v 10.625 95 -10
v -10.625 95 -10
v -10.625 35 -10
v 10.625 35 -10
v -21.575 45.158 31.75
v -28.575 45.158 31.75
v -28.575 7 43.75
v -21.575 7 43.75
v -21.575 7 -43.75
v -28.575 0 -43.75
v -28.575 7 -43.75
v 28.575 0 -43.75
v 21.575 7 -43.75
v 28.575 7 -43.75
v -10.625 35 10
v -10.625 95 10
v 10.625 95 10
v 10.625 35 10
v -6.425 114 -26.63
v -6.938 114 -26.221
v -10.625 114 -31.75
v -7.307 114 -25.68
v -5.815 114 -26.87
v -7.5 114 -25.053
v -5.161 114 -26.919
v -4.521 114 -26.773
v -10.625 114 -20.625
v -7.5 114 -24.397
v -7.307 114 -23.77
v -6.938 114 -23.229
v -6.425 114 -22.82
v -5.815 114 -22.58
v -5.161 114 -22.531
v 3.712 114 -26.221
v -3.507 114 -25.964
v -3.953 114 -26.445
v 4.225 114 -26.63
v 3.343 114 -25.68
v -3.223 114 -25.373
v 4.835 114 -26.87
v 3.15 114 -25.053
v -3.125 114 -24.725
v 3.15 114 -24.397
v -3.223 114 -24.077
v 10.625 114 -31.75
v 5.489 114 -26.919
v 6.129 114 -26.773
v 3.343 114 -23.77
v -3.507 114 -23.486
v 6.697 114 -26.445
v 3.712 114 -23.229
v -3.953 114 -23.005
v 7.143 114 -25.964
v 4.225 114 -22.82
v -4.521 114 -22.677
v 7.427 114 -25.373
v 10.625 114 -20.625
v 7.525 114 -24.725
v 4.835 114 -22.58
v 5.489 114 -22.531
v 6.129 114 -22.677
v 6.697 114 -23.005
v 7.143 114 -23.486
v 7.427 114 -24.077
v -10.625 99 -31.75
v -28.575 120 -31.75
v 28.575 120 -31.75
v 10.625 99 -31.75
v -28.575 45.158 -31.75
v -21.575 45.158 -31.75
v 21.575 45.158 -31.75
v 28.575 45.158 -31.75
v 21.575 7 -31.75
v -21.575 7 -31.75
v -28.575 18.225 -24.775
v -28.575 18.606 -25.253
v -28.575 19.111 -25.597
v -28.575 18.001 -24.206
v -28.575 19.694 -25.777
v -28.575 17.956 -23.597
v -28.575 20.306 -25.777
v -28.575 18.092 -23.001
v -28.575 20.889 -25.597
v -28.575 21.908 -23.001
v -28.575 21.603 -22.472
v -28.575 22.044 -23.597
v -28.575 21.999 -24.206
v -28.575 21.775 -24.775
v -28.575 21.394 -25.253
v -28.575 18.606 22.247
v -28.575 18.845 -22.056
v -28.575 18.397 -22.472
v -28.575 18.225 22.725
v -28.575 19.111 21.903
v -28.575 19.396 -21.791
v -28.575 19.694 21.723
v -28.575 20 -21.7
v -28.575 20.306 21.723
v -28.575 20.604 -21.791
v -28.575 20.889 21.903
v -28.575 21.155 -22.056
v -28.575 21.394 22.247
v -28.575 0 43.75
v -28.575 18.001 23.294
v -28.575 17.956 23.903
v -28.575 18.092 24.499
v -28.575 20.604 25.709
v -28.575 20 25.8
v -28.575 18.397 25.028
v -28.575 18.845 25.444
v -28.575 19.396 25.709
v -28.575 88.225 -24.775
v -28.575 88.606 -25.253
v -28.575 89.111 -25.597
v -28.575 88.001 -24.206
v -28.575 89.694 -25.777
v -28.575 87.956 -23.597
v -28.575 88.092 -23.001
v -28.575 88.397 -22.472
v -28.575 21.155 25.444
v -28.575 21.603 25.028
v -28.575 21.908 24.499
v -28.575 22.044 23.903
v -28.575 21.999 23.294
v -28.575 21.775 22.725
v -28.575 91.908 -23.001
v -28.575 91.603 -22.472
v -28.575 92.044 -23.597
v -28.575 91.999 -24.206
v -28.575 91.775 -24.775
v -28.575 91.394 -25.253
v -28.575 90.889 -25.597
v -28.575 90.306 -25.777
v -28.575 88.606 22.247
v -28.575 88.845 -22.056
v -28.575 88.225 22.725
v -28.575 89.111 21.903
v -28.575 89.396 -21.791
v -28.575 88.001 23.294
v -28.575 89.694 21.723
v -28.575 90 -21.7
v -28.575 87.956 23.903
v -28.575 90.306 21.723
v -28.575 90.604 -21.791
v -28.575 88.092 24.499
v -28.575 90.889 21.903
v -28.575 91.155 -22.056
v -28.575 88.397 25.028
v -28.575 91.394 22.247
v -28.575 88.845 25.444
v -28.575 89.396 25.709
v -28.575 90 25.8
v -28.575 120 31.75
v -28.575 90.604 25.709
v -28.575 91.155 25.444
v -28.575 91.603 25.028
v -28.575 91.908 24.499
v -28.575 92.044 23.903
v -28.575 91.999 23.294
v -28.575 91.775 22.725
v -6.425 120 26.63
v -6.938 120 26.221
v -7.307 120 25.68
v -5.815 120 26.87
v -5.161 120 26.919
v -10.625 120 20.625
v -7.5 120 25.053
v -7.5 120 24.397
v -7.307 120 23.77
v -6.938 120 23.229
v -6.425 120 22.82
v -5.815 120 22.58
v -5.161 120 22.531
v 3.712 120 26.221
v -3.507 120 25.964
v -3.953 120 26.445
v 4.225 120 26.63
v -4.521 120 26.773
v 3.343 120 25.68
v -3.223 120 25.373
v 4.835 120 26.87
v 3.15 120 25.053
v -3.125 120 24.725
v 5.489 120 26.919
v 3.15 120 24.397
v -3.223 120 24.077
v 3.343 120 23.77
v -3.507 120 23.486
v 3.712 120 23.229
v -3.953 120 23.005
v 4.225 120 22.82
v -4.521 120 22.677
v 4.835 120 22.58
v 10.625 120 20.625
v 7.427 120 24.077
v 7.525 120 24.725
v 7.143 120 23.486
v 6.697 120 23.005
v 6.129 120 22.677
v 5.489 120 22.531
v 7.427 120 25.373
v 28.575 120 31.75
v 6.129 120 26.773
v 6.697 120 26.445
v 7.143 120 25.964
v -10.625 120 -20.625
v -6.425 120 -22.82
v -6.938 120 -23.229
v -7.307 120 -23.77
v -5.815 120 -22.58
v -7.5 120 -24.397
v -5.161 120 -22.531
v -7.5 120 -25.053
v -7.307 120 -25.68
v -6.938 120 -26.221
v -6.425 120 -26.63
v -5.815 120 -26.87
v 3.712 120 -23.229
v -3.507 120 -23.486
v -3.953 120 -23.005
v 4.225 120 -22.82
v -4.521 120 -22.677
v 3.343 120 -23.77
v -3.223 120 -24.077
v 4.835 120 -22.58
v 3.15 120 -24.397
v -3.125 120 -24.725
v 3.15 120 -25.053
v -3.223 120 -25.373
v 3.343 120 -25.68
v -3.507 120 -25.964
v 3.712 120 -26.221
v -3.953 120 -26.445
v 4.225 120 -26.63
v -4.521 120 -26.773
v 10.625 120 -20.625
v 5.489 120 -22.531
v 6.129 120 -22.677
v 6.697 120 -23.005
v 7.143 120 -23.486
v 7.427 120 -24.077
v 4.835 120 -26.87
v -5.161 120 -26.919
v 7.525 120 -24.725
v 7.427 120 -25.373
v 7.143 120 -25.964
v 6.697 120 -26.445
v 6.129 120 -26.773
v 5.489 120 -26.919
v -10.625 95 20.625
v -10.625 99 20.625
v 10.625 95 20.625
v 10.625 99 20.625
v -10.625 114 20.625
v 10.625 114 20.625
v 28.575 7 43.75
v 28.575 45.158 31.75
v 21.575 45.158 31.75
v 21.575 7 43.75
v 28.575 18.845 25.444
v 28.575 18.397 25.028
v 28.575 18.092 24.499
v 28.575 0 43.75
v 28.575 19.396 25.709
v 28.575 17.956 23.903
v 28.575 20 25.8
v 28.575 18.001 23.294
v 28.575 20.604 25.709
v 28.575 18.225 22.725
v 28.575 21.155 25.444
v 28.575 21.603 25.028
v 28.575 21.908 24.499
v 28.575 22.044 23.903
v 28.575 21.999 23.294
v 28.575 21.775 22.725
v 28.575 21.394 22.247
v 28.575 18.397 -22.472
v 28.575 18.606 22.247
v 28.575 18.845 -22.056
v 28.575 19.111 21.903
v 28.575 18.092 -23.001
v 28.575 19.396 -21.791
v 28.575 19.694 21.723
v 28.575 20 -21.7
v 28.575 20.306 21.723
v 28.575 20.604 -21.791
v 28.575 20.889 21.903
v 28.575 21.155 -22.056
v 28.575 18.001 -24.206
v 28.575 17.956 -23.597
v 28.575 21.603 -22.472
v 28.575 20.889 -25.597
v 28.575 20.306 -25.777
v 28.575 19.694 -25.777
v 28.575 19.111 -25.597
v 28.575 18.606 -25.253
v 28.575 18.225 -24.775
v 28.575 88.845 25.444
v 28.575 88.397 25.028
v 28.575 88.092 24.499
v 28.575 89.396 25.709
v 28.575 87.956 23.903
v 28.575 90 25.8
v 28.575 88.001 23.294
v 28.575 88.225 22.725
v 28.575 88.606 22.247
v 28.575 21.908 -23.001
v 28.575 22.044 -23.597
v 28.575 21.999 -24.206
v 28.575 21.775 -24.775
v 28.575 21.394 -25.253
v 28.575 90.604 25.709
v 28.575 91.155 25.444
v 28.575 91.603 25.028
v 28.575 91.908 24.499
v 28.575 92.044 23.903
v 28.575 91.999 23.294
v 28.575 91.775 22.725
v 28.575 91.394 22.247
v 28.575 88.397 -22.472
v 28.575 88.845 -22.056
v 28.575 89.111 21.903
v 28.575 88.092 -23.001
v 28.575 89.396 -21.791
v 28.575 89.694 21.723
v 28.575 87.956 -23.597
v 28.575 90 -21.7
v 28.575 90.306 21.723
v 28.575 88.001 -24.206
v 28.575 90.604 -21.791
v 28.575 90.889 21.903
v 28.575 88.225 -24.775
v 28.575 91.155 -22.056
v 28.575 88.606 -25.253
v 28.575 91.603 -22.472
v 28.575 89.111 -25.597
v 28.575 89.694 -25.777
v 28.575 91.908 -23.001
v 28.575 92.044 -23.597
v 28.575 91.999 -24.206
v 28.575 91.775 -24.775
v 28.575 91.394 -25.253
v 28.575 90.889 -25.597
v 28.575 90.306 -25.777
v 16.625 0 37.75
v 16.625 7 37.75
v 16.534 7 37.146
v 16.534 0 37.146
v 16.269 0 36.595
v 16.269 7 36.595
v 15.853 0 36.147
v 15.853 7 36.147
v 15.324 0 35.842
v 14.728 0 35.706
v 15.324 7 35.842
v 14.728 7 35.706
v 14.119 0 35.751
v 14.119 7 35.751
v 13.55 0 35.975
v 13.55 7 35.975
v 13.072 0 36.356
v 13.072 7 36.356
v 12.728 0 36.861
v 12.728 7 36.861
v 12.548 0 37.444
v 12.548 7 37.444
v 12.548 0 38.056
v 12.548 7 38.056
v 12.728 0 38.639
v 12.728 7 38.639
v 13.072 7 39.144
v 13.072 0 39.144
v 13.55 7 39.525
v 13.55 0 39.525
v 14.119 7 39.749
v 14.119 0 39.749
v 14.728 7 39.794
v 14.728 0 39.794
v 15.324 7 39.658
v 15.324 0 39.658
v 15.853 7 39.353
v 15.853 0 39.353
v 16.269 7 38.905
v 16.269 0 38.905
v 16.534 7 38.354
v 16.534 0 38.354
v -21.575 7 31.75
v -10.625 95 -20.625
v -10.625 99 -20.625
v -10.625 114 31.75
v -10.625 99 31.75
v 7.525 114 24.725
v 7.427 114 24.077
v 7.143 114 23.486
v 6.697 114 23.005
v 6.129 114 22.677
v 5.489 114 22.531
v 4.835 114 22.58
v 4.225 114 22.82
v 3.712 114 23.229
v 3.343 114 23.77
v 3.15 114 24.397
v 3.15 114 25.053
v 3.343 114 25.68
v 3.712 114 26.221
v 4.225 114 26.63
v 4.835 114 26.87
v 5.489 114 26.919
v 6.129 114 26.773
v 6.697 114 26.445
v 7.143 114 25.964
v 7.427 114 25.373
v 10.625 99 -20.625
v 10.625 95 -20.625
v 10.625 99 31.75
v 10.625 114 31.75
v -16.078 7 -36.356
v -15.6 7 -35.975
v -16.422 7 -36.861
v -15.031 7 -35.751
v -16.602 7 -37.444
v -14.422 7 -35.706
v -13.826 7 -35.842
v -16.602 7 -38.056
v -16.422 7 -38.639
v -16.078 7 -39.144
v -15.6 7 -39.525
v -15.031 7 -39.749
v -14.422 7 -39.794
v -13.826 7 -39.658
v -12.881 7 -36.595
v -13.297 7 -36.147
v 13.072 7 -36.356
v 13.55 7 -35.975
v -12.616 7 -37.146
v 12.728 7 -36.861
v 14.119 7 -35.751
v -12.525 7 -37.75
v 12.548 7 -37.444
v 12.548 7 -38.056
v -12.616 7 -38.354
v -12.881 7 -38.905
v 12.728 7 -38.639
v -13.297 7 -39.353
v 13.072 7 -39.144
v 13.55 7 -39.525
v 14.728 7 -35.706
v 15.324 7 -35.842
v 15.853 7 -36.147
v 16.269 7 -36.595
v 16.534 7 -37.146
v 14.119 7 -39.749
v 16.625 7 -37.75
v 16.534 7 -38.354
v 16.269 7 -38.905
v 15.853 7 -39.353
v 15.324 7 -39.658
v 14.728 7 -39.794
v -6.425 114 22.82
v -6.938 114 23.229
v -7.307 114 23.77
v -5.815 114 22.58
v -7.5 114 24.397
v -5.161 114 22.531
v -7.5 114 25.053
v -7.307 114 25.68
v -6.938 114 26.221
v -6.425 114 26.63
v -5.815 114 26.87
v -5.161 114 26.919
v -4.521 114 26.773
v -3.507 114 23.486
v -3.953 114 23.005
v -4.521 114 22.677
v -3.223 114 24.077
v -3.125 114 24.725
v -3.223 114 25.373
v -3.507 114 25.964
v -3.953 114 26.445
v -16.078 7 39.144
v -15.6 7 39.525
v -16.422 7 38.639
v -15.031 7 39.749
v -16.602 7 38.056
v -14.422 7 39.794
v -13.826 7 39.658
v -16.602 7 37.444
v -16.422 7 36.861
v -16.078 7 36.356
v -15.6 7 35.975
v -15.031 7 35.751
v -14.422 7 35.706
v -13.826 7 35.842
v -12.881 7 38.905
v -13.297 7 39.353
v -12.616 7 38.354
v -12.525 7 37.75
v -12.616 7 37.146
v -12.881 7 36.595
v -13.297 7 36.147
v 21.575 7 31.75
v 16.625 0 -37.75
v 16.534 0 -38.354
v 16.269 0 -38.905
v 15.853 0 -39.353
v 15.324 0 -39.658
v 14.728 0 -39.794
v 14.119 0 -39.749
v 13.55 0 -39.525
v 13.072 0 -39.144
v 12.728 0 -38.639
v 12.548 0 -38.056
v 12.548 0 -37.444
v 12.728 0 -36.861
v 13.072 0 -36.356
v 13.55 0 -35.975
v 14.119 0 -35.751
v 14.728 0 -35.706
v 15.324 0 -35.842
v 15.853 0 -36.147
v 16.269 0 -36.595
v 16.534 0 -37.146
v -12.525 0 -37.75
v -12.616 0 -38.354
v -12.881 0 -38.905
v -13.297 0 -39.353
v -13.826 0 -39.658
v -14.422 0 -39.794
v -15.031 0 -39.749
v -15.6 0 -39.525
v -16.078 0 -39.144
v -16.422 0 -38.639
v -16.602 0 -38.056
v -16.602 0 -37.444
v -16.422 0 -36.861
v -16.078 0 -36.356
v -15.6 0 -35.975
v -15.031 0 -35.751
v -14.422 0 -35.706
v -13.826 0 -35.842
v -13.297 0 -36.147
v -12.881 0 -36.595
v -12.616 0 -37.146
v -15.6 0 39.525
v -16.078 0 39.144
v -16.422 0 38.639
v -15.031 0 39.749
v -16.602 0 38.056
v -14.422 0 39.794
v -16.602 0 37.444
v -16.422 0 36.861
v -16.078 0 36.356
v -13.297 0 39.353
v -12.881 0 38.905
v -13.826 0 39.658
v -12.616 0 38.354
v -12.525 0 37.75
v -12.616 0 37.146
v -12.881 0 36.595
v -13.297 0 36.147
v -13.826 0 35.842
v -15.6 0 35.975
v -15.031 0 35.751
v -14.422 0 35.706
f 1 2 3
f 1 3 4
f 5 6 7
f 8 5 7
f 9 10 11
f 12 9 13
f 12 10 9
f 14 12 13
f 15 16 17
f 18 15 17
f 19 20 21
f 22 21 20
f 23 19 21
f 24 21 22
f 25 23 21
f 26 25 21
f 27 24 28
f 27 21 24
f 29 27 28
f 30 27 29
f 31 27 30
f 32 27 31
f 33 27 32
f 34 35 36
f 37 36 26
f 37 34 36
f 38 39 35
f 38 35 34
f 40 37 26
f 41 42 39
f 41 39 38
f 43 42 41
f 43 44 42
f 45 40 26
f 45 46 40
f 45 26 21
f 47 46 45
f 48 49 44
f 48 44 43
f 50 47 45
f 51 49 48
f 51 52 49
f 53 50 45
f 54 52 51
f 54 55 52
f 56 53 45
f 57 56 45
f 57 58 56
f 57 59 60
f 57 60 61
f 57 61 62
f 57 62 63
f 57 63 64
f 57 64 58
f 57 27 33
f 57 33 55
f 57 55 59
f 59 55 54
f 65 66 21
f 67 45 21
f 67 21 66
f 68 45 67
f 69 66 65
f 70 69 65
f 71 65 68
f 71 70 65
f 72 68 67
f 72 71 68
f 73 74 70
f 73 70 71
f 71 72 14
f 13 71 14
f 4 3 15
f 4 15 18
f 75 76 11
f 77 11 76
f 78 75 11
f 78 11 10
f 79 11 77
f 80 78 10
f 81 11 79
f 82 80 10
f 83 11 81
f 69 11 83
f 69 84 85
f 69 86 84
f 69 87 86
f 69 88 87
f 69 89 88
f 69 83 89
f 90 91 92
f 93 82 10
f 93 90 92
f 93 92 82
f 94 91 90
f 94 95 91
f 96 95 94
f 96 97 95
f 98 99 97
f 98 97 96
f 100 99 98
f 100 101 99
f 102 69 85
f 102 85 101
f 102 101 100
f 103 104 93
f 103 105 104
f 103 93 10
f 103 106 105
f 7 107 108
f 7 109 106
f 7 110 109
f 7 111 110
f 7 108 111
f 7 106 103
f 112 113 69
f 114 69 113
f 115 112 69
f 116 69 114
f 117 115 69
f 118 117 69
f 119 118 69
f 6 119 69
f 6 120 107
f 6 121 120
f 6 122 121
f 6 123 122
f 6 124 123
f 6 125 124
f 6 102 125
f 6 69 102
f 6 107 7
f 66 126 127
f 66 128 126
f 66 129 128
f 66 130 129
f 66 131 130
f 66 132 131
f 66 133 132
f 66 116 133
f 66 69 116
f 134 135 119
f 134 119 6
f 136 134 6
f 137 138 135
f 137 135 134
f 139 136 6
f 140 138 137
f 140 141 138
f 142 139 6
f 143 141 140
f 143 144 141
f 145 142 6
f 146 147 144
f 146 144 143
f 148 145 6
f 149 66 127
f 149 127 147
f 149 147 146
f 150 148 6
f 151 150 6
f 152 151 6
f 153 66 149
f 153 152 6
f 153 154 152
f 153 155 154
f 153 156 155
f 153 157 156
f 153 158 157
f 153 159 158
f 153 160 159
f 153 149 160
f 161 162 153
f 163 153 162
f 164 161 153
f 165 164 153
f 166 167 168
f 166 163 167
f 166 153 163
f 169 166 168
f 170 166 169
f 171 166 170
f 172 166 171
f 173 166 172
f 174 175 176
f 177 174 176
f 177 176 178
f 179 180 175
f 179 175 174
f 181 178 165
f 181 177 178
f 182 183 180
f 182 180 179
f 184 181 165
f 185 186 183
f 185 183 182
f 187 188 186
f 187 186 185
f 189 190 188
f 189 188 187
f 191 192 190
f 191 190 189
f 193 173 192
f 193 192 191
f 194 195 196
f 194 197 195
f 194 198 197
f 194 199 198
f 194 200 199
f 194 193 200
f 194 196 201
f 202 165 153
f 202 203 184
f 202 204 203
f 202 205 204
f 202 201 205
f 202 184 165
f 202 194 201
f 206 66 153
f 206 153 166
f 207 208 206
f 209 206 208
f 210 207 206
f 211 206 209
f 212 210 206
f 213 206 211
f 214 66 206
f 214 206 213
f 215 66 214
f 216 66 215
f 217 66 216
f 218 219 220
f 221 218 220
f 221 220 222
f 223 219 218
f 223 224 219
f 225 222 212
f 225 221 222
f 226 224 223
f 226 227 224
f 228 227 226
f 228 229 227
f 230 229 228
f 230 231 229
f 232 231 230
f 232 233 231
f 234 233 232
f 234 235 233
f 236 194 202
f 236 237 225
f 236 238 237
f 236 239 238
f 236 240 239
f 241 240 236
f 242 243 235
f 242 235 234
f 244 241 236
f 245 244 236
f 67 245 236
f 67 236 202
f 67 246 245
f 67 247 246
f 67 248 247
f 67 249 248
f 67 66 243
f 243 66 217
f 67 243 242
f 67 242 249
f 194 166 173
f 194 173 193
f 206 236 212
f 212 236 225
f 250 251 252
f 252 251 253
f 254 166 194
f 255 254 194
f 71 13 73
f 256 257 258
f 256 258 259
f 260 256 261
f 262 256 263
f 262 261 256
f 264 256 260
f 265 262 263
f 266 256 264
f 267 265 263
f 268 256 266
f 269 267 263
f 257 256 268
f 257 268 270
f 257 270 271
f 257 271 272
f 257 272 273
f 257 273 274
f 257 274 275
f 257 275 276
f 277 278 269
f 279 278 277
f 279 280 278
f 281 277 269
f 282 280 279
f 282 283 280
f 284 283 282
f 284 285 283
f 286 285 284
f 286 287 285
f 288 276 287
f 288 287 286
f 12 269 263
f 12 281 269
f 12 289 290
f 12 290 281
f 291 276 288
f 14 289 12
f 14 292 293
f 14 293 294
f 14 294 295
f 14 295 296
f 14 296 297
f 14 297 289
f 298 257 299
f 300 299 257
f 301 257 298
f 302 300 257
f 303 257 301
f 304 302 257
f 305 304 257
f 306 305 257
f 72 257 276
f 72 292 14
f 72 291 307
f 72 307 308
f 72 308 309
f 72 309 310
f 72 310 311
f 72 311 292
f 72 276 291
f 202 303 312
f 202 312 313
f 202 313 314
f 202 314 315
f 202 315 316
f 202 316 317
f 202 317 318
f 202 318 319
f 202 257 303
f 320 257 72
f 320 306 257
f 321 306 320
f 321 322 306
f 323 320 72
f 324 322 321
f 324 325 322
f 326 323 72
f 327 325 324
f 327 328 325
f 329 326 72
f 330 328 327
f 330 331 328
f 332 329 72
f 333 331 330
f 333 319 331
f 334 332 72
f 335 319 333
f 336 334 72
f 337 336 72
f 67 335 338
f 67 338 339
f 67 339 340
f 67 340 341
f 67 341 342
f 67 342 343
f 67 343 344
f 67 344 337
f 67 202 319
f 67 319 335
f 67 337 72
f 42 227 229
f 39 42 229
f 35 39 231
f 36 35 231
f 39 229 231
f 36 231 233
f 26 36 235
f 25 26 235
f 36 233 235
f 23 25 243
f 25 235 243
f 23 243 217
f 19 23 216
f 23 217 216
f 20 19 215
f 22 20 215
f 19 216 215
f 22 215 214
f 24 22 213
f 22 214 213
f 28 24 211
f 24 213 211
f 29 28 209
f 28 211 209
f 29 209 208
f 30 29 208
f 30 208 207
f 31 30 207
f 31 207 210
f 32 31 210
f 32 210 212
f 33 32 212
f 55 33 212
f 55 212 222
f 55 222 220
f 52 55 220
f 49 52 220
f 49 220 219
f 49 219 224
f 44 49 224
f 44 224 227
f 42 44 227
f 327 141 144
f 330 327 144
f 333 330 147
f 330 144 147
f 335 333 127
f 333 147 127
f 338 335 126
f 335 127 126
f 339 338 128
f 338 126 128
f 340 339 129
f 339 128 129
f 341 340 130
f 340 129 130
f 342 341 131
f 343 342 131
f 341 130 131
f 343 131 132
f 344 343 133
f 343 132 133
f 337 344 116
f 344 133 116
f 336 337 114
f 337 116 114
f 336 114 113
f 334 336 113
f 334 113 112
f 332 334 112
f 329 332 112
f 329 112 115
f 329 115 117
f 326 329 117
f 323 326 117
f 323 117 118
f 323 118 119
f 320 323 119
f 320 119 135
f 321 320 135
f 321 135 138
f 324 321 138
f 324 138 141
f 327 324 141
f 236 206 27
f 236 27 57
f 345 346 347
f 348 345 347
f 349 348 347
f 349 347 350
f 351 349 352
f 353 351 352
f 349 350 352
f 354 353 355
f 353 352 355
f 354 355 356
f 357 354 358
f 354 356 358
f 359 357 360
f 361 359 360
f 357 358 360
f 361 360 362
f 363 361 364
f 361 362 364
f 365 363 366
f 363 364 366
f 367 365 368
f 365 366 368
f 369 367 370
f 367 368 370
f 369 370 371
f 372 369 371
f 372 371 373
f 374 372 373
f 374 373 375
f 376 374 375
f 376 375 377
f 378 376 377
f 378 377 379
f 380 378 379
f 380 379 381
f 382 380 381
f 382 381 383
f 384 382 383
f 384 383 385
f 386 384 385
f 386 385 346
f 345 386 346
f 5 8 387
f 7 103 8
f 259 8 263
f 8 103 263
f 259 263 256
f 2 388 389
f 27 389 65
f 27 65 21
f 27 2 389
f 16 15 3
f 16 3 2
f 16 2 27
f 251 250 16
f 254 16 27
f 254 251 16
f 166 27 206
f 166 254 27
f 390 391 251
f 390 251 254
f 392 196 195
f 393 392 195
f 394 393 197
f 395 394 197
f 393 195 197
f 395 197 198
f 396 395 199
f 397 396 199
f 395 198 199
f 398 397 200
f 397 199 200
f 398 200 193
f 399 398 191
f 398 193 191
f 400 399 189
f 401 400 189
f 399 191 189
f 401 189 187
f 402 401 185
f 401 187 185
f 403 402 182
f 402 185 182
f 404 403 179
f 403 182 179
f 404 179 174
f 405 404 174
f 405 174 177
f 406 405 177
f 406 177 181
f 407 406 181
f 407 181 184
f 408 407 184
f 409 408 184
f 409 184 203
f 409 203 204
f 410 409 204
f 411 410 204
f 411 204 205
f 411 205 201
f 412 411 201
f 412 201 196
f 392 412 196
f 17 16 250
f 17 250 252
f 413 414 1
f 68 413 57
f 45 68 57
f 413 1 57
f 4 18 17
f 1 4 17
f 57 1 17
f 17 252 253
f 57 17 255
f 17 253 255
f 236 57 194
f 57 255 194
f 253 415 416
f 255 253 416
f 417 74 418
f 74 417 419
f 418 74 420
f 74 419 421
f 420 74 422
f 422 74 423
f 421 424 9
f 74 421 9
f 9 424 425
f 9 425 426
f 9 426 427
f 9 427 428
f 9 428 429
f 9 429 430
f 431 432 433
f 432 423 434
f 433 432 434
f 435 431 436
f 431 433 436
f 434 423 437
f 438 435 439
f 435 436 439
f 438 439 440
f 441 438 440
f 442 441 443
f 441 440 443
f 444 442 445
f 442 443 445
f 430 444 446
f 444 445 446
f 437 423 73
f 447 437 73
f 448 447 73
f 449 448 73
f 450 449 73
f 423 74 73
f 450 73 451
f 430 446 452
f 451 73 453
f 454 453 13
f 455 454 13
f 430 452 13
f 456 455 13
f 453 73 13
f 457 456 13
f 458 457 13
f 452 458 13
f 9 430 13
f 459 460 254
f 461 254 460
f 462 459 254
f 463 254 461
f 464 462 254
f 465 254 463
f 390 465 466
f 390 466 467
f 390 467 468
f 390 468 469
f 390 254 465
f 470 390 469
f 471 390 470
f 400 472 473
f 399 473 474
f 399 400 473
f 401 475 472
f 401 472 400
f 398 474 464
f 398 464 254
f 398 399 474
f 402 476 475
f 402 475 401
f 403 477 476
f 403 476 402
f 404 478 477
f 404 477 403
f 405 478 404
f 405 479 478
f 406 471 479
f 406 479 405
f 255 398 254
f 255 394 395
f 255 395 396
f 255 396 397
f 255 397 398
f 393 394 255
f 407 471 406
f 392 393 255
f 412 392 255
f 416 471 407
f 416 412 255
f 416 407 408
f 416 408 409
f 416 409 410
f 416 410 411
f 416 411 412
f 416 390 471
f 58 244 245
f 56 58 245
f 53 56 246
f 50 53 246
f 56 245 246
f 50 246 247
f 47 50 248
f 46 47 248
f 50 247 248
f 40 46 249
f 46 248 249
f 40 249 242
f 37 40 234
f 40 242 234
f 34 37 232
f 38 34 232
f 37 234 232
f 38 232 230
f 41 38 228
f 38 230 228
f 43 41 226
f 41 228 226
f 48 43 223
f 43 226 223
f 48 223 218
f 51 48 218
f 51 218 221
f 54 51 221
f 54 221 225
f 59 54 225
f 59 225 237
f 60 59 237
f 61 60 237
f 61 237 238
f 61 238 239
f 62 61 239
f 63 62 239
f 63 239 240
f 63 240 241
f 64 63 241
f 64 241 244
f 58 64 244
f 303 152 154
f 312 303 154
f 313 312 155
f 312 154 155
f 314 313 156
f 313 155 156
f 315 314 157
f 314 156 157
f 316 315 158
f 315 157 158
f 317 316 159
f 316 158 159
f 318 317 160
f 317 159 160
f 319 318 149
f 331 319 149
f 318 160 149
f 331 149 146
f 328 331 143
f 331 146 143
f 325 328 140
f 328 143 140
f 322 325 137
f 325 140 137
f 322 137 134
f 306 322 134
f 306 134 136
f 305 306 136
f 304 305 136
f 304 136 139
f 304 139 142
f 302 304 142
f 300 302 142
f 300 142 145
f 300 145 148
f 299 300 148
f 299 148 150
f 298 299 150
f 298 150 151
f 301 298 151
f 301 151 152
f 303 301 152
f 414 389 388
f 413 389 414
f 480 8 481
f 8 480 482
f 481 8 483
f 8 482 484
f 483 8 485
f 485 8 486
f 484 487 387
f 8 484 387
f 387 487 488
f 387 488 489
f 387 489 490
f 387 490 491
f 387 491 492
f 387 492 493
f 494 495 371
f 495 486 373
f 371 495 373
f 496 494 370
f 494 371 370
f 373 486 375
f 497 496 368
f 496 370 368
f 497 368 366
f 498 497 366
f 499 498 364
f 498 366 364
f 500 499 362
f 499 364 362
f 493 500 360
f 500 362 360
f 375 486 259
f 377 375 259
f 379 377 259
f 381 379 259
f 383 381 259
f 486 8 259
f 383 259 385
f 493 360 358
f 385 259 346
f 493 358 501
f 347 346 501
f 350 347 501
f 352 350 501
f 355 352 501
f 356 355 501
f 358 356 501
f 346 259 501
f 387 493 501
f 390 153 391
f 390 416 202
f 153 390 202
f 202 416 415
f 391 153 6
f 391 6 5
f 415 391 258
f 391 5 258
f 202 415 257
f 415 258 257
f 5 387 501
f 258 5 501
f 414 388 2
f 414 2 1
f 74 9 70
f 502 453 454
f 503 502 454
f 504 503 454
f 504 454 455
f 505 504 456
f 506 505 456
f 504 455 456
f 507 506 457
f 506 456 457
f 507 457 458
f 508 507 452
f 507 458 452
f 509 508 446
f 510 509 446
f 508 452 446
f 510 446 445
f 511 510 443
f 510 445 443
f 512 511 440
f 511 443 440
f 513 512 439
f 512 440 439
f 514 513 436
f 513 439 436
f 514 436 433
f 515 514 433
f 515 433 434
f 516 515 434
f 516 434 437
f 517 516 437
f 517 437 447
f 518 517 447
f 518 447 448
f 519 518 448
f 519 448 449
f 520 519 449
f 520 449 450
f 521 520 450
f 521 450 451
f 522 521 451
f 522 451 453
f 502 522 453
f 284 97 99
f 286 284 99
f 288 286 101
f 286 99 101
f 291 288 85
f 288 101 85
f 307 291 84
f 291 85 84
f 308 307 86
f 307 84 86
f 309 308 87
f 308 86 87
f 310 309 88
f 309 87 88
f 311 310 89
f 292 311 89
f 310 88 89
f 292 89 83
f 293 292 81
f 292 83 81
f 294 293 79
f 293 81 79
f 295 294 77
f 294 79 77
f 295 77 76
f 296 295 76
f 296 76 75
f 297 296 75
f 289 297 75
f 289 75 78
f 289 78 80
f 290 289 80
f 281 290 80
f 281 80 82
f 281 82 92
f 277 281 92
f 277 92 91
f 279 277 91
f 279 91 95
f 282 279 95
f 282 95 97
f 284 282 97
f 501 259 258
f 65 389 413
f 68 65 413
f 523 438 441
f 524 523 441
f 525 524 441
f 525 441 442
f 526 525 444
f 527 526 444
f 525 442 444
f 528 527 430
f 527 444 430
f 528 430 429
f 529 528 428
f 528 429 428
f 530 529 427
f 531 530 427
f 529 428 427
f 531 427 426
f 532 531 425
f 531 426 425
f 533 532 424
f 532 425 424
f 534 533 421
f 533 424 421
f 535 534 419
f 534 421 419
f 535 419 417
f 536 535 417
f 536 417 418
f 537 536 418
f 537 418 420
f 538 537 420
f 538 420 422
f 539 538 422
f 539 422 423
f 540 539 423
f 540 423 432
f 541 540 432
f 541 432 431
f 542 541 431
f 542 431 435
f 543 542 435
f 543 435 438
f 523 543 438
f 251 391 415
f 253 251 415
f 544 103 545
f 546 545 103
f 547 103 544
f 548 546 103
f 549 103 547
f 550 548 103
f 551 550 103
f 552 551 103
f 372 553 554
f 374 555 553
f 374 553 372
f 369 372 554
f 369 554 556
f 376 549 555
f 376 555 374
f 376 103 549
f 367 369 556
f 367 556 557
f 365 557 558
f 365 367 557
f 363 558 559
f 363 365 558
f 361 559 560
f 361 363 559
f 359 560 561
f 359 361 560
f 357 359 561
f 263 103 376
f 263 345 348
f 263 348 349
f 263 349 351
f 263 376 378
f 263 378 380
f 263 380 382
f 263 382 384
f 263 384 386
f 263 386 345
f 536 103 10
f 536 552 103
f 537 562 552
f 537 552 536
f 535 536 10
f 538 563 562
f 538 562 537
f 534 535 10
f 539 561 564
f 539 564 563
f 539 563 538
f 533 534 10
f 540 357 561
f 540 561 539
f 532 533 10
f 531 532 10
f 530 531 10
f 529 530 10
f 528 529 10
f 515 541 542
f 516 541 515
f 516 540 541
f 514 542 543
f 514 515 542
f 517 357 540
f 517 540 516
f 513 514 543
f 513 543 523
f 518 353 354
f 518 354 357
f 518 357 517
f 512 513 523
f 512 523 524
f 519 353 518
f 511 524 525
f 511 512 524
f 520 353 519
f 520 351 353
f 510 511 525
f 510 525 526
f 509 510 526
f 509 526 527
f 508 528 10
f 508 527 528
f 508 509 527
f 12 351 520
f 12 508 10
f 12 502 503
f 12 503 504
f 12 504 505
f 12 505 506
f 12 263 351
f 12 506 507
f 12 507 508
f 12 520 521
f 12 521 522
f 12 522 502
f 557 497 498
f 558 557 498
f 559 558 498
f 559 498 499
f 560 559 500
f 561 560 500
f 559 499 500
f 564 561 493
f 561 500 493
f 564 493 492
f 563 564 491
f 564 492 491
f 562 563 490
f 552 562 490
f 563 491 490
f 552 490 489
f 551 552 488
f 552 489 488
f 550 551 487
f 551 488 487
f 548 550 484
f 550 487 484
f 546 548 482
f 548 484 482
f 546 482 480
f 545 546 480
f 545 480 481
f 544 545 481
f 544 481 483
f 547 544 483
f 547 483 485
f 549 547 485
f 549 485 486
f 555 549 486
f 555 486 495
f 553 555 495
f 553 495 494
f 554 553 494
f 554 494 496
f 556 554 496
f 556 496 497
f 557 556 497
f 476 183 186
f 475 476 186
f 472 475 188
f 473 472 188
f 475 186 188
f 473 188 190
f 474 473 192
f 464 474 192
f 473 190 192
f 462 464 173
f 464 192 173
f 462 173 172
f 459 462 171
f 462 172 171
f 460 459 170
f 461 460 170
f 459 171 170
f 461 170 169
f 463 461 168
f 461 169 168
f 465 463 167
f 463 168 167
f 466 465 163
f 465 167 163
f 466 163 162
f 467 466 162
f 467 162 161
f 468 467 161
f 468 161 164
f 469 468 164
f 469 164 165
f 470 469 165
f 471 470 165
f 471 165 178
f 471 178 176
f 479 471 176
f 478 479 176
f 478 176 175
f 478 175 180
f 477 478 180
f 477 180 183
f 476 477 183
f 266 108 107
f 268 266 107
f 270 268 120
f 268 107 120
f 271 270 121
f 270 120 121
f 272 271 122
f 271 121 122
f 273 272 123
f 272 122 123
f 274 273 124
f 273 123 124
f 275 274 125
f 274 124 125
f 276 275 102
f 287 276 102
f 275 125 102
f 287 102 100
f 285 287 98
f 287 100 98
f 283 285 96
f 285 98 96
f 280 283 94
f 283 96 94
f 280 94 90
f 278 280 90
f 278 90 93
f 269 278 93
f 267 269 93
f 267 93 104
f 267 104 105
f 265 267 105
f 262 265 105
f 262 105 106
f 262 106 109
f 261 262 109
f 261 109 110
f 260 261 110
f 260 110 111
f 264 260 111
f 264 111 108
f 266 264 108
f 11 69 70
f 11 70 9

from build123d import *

# Parameters (mm, degrees)
SKETCH1_W           = 57.15
SKETCH1_H           = 63.5
BOSS_EXTRUDE1_DEPTH = 120
SKETCH2_W           = 21.25
SKETCH2_H           = 41.25
CUT_EXTRUDE1_DEPTH  = 25
SKETCH3_R           = 2.2
CUT_EXTRUDE2_DEPTH  = 10
SKETCH4_W           = 21.25
SKETCH4_H           = 15
CUT_EXTRUDE3_DEPTH  = 64.5
SKETCH7_R           = 2.05
CUT_EXTRUDE4_DEPTH  = 58.15
SKETCH9_W           = 12
SKETCH9_H           = 7
BOSS_EXTRUDE2_DEPTH = 57.15
SKETCH10_R          = 2.05
CUT_EXTRUDE5_DEPTH  = 8
BOSS_EXTRUDE3_DEPTH = 7
BOSS_EXTRUDE4_DEPTH = 7
SKETCH13_W          = 21.25
SKETCH13_H          = 20
CUT_EXTRUDE6_DEPTH  = 60


with BuildPart() as part:
    # Sketch1 → Boss-Extrude1 (new body)
    with BuildSketch(Plane(origin=(0, 0, 0), x_dir=(1, 0, 0), z_dir=(0, 1, 0))):
        Rectangle(SKETCH1_W, SKETCH1_H)
    extrude(amount=BOSS_EXTRUDE1_DEPTH)

    # Sketch2 → Cut-Extrude1 (cut)
    with BuildSketch(Plane(origin=(0, 120, 0), x_dir=(1, 0, 0), z_dir=(0, 1, 0))):
        Rectangle(SKETCH2_W, SKETCH2_H)
    extrude(amount=-CUT_EXTRUDE1_DEPTH, mode=Mode.SUBTRACT)

    # Sketch3 → Cut-Extrude2 (cut)
    with BuildSketch(Plane(origin=(0, 120, 0), x_dir=(1, 0, 0), z_dir=(0, 1, 0))):
        with Locations((5.325, 24.725)):
            Circle(SKETCH3_R)
        with Locations((-5.325, 24.725)):
            Circle(SKETCH3_R)
        with Locations((5.325, -24.725)):
            Circle(SKETCH3_R)
        with Locations((-5.325, -24.725)):
            Circle(SKETCH3_R)
    extrude(amount=-CUT_EXTRUDE2_DEPTH, mode=Mode.SUBTRACT)

    # Sketch4 → Cut-Extrude3 (cut, through all)
    with BuildSketch(Plane.XY.offset(31.75)):
        with Locations((0, 106.5)):
            Rectangle(SKETCH4_W, SKETCH4_H)
    extrude(amount=-CUT_EXTRUDE3_DEPTH, mode=Mode.SUBTRACT)

    # Sketch7 → Cut-Extrude4 (cut, through all)
    with BuildSketch(Plane.ZY.offset(28.575)):
        with Locations((23.75, 20)):
            Circle(SKETCH7_R)
        with Locations((23.75, 90)):
            Circle(SKETCH7_R)
        with Locations((-23.75, 20)):
            Circle(SKETCH7_R)
        with Locations((-23.75, 90)):
            Circle(SKETCH7_R)
    extrude(amount=-CUT_EXTRUDE4_DEPTH, mode=Mode.SUBTRACT)

    # Sketch9 → Boss-Extrude2 (add)
    with BuildSketch(Plane(origin=(28.575, 0, 0), x_dir=(0, 0, -1), z_dir=(1, 0, 0))):
        with Locations((37.75, 3.5)):
            Rectangle(SKETCH9_W, SKETCH9_H)
        with Locations((-37.75, 3.5)):
            Rectangle(SKETCH9_W, SKETCH9_H)
    extrude(amount=-BOSS_EXTRUDE2_DEPTH)

    # Sketch10 → Cut-Extrude5 (cut, through all)
    with BuildSketch(Plane(origin=(0, 7, 0), x_dir=(1, 0, 0), z_dir=(0, 1, 0))):
        with Locations((-14.575, 37.75)):
            Circle(SKETCH10_R)
        with Locations((14.575, 37.75)):
            Circle(SKETCH10_R)
        with Locations((14.575, -37.75)):
            Circle(SKETCH10_R)
        with Locations((-14.575, -37.75)):
            Circle(SKETCH10_R)
    extrude(amount=-CUT_EXTRUDE5_DEPTH, mode=Mode.SUBTRACT)

    # Sketch11 → Boss-Extrude3 (add)
    with BuildSketch(Plane(origin=(28.575, 0, 0), x_dir=(0, 0, -1), z_dir=(1, 0, 0))):
        Polygon((-31.75, 45.157568057), (-43.75, 7), (-31.75, 7), align=None)
        Polygon((43.75, 7), (31.75, 7), (31.75, 45.157568057), align=None)
    extrude(amount=-BOSS_EXTRUDE3_DEPTH)

    # Sketch12 → Boss-Extrude4 (add)
    with BuildSketch(Plane.ZY.offset(28.575)):
        Polygon((-31.75, 45.157568057), (-43.75, 7), (-31.75, 7), align=None)
        Polygon((43.75, 7), (31.75, 7), (31.75, 45.157568057), align=None)
    extrude(amount=-BOSS_EXTRUDE4_DEPTH)

    # Sketch13 → Cut-Extrude6 (cut)
    with BuildSketch(Plane(origin=(0, 95, 0), x_dir=(1, 0, 0), z_dir=(0, 1, 0))):
        Rectangle(SKETCH13_W, SKETCH13_H)
    extrude(amount=-CUT_EXTRUDE6_DEPTH, mode=Mode.SUBTRACT)


solid = part.part
